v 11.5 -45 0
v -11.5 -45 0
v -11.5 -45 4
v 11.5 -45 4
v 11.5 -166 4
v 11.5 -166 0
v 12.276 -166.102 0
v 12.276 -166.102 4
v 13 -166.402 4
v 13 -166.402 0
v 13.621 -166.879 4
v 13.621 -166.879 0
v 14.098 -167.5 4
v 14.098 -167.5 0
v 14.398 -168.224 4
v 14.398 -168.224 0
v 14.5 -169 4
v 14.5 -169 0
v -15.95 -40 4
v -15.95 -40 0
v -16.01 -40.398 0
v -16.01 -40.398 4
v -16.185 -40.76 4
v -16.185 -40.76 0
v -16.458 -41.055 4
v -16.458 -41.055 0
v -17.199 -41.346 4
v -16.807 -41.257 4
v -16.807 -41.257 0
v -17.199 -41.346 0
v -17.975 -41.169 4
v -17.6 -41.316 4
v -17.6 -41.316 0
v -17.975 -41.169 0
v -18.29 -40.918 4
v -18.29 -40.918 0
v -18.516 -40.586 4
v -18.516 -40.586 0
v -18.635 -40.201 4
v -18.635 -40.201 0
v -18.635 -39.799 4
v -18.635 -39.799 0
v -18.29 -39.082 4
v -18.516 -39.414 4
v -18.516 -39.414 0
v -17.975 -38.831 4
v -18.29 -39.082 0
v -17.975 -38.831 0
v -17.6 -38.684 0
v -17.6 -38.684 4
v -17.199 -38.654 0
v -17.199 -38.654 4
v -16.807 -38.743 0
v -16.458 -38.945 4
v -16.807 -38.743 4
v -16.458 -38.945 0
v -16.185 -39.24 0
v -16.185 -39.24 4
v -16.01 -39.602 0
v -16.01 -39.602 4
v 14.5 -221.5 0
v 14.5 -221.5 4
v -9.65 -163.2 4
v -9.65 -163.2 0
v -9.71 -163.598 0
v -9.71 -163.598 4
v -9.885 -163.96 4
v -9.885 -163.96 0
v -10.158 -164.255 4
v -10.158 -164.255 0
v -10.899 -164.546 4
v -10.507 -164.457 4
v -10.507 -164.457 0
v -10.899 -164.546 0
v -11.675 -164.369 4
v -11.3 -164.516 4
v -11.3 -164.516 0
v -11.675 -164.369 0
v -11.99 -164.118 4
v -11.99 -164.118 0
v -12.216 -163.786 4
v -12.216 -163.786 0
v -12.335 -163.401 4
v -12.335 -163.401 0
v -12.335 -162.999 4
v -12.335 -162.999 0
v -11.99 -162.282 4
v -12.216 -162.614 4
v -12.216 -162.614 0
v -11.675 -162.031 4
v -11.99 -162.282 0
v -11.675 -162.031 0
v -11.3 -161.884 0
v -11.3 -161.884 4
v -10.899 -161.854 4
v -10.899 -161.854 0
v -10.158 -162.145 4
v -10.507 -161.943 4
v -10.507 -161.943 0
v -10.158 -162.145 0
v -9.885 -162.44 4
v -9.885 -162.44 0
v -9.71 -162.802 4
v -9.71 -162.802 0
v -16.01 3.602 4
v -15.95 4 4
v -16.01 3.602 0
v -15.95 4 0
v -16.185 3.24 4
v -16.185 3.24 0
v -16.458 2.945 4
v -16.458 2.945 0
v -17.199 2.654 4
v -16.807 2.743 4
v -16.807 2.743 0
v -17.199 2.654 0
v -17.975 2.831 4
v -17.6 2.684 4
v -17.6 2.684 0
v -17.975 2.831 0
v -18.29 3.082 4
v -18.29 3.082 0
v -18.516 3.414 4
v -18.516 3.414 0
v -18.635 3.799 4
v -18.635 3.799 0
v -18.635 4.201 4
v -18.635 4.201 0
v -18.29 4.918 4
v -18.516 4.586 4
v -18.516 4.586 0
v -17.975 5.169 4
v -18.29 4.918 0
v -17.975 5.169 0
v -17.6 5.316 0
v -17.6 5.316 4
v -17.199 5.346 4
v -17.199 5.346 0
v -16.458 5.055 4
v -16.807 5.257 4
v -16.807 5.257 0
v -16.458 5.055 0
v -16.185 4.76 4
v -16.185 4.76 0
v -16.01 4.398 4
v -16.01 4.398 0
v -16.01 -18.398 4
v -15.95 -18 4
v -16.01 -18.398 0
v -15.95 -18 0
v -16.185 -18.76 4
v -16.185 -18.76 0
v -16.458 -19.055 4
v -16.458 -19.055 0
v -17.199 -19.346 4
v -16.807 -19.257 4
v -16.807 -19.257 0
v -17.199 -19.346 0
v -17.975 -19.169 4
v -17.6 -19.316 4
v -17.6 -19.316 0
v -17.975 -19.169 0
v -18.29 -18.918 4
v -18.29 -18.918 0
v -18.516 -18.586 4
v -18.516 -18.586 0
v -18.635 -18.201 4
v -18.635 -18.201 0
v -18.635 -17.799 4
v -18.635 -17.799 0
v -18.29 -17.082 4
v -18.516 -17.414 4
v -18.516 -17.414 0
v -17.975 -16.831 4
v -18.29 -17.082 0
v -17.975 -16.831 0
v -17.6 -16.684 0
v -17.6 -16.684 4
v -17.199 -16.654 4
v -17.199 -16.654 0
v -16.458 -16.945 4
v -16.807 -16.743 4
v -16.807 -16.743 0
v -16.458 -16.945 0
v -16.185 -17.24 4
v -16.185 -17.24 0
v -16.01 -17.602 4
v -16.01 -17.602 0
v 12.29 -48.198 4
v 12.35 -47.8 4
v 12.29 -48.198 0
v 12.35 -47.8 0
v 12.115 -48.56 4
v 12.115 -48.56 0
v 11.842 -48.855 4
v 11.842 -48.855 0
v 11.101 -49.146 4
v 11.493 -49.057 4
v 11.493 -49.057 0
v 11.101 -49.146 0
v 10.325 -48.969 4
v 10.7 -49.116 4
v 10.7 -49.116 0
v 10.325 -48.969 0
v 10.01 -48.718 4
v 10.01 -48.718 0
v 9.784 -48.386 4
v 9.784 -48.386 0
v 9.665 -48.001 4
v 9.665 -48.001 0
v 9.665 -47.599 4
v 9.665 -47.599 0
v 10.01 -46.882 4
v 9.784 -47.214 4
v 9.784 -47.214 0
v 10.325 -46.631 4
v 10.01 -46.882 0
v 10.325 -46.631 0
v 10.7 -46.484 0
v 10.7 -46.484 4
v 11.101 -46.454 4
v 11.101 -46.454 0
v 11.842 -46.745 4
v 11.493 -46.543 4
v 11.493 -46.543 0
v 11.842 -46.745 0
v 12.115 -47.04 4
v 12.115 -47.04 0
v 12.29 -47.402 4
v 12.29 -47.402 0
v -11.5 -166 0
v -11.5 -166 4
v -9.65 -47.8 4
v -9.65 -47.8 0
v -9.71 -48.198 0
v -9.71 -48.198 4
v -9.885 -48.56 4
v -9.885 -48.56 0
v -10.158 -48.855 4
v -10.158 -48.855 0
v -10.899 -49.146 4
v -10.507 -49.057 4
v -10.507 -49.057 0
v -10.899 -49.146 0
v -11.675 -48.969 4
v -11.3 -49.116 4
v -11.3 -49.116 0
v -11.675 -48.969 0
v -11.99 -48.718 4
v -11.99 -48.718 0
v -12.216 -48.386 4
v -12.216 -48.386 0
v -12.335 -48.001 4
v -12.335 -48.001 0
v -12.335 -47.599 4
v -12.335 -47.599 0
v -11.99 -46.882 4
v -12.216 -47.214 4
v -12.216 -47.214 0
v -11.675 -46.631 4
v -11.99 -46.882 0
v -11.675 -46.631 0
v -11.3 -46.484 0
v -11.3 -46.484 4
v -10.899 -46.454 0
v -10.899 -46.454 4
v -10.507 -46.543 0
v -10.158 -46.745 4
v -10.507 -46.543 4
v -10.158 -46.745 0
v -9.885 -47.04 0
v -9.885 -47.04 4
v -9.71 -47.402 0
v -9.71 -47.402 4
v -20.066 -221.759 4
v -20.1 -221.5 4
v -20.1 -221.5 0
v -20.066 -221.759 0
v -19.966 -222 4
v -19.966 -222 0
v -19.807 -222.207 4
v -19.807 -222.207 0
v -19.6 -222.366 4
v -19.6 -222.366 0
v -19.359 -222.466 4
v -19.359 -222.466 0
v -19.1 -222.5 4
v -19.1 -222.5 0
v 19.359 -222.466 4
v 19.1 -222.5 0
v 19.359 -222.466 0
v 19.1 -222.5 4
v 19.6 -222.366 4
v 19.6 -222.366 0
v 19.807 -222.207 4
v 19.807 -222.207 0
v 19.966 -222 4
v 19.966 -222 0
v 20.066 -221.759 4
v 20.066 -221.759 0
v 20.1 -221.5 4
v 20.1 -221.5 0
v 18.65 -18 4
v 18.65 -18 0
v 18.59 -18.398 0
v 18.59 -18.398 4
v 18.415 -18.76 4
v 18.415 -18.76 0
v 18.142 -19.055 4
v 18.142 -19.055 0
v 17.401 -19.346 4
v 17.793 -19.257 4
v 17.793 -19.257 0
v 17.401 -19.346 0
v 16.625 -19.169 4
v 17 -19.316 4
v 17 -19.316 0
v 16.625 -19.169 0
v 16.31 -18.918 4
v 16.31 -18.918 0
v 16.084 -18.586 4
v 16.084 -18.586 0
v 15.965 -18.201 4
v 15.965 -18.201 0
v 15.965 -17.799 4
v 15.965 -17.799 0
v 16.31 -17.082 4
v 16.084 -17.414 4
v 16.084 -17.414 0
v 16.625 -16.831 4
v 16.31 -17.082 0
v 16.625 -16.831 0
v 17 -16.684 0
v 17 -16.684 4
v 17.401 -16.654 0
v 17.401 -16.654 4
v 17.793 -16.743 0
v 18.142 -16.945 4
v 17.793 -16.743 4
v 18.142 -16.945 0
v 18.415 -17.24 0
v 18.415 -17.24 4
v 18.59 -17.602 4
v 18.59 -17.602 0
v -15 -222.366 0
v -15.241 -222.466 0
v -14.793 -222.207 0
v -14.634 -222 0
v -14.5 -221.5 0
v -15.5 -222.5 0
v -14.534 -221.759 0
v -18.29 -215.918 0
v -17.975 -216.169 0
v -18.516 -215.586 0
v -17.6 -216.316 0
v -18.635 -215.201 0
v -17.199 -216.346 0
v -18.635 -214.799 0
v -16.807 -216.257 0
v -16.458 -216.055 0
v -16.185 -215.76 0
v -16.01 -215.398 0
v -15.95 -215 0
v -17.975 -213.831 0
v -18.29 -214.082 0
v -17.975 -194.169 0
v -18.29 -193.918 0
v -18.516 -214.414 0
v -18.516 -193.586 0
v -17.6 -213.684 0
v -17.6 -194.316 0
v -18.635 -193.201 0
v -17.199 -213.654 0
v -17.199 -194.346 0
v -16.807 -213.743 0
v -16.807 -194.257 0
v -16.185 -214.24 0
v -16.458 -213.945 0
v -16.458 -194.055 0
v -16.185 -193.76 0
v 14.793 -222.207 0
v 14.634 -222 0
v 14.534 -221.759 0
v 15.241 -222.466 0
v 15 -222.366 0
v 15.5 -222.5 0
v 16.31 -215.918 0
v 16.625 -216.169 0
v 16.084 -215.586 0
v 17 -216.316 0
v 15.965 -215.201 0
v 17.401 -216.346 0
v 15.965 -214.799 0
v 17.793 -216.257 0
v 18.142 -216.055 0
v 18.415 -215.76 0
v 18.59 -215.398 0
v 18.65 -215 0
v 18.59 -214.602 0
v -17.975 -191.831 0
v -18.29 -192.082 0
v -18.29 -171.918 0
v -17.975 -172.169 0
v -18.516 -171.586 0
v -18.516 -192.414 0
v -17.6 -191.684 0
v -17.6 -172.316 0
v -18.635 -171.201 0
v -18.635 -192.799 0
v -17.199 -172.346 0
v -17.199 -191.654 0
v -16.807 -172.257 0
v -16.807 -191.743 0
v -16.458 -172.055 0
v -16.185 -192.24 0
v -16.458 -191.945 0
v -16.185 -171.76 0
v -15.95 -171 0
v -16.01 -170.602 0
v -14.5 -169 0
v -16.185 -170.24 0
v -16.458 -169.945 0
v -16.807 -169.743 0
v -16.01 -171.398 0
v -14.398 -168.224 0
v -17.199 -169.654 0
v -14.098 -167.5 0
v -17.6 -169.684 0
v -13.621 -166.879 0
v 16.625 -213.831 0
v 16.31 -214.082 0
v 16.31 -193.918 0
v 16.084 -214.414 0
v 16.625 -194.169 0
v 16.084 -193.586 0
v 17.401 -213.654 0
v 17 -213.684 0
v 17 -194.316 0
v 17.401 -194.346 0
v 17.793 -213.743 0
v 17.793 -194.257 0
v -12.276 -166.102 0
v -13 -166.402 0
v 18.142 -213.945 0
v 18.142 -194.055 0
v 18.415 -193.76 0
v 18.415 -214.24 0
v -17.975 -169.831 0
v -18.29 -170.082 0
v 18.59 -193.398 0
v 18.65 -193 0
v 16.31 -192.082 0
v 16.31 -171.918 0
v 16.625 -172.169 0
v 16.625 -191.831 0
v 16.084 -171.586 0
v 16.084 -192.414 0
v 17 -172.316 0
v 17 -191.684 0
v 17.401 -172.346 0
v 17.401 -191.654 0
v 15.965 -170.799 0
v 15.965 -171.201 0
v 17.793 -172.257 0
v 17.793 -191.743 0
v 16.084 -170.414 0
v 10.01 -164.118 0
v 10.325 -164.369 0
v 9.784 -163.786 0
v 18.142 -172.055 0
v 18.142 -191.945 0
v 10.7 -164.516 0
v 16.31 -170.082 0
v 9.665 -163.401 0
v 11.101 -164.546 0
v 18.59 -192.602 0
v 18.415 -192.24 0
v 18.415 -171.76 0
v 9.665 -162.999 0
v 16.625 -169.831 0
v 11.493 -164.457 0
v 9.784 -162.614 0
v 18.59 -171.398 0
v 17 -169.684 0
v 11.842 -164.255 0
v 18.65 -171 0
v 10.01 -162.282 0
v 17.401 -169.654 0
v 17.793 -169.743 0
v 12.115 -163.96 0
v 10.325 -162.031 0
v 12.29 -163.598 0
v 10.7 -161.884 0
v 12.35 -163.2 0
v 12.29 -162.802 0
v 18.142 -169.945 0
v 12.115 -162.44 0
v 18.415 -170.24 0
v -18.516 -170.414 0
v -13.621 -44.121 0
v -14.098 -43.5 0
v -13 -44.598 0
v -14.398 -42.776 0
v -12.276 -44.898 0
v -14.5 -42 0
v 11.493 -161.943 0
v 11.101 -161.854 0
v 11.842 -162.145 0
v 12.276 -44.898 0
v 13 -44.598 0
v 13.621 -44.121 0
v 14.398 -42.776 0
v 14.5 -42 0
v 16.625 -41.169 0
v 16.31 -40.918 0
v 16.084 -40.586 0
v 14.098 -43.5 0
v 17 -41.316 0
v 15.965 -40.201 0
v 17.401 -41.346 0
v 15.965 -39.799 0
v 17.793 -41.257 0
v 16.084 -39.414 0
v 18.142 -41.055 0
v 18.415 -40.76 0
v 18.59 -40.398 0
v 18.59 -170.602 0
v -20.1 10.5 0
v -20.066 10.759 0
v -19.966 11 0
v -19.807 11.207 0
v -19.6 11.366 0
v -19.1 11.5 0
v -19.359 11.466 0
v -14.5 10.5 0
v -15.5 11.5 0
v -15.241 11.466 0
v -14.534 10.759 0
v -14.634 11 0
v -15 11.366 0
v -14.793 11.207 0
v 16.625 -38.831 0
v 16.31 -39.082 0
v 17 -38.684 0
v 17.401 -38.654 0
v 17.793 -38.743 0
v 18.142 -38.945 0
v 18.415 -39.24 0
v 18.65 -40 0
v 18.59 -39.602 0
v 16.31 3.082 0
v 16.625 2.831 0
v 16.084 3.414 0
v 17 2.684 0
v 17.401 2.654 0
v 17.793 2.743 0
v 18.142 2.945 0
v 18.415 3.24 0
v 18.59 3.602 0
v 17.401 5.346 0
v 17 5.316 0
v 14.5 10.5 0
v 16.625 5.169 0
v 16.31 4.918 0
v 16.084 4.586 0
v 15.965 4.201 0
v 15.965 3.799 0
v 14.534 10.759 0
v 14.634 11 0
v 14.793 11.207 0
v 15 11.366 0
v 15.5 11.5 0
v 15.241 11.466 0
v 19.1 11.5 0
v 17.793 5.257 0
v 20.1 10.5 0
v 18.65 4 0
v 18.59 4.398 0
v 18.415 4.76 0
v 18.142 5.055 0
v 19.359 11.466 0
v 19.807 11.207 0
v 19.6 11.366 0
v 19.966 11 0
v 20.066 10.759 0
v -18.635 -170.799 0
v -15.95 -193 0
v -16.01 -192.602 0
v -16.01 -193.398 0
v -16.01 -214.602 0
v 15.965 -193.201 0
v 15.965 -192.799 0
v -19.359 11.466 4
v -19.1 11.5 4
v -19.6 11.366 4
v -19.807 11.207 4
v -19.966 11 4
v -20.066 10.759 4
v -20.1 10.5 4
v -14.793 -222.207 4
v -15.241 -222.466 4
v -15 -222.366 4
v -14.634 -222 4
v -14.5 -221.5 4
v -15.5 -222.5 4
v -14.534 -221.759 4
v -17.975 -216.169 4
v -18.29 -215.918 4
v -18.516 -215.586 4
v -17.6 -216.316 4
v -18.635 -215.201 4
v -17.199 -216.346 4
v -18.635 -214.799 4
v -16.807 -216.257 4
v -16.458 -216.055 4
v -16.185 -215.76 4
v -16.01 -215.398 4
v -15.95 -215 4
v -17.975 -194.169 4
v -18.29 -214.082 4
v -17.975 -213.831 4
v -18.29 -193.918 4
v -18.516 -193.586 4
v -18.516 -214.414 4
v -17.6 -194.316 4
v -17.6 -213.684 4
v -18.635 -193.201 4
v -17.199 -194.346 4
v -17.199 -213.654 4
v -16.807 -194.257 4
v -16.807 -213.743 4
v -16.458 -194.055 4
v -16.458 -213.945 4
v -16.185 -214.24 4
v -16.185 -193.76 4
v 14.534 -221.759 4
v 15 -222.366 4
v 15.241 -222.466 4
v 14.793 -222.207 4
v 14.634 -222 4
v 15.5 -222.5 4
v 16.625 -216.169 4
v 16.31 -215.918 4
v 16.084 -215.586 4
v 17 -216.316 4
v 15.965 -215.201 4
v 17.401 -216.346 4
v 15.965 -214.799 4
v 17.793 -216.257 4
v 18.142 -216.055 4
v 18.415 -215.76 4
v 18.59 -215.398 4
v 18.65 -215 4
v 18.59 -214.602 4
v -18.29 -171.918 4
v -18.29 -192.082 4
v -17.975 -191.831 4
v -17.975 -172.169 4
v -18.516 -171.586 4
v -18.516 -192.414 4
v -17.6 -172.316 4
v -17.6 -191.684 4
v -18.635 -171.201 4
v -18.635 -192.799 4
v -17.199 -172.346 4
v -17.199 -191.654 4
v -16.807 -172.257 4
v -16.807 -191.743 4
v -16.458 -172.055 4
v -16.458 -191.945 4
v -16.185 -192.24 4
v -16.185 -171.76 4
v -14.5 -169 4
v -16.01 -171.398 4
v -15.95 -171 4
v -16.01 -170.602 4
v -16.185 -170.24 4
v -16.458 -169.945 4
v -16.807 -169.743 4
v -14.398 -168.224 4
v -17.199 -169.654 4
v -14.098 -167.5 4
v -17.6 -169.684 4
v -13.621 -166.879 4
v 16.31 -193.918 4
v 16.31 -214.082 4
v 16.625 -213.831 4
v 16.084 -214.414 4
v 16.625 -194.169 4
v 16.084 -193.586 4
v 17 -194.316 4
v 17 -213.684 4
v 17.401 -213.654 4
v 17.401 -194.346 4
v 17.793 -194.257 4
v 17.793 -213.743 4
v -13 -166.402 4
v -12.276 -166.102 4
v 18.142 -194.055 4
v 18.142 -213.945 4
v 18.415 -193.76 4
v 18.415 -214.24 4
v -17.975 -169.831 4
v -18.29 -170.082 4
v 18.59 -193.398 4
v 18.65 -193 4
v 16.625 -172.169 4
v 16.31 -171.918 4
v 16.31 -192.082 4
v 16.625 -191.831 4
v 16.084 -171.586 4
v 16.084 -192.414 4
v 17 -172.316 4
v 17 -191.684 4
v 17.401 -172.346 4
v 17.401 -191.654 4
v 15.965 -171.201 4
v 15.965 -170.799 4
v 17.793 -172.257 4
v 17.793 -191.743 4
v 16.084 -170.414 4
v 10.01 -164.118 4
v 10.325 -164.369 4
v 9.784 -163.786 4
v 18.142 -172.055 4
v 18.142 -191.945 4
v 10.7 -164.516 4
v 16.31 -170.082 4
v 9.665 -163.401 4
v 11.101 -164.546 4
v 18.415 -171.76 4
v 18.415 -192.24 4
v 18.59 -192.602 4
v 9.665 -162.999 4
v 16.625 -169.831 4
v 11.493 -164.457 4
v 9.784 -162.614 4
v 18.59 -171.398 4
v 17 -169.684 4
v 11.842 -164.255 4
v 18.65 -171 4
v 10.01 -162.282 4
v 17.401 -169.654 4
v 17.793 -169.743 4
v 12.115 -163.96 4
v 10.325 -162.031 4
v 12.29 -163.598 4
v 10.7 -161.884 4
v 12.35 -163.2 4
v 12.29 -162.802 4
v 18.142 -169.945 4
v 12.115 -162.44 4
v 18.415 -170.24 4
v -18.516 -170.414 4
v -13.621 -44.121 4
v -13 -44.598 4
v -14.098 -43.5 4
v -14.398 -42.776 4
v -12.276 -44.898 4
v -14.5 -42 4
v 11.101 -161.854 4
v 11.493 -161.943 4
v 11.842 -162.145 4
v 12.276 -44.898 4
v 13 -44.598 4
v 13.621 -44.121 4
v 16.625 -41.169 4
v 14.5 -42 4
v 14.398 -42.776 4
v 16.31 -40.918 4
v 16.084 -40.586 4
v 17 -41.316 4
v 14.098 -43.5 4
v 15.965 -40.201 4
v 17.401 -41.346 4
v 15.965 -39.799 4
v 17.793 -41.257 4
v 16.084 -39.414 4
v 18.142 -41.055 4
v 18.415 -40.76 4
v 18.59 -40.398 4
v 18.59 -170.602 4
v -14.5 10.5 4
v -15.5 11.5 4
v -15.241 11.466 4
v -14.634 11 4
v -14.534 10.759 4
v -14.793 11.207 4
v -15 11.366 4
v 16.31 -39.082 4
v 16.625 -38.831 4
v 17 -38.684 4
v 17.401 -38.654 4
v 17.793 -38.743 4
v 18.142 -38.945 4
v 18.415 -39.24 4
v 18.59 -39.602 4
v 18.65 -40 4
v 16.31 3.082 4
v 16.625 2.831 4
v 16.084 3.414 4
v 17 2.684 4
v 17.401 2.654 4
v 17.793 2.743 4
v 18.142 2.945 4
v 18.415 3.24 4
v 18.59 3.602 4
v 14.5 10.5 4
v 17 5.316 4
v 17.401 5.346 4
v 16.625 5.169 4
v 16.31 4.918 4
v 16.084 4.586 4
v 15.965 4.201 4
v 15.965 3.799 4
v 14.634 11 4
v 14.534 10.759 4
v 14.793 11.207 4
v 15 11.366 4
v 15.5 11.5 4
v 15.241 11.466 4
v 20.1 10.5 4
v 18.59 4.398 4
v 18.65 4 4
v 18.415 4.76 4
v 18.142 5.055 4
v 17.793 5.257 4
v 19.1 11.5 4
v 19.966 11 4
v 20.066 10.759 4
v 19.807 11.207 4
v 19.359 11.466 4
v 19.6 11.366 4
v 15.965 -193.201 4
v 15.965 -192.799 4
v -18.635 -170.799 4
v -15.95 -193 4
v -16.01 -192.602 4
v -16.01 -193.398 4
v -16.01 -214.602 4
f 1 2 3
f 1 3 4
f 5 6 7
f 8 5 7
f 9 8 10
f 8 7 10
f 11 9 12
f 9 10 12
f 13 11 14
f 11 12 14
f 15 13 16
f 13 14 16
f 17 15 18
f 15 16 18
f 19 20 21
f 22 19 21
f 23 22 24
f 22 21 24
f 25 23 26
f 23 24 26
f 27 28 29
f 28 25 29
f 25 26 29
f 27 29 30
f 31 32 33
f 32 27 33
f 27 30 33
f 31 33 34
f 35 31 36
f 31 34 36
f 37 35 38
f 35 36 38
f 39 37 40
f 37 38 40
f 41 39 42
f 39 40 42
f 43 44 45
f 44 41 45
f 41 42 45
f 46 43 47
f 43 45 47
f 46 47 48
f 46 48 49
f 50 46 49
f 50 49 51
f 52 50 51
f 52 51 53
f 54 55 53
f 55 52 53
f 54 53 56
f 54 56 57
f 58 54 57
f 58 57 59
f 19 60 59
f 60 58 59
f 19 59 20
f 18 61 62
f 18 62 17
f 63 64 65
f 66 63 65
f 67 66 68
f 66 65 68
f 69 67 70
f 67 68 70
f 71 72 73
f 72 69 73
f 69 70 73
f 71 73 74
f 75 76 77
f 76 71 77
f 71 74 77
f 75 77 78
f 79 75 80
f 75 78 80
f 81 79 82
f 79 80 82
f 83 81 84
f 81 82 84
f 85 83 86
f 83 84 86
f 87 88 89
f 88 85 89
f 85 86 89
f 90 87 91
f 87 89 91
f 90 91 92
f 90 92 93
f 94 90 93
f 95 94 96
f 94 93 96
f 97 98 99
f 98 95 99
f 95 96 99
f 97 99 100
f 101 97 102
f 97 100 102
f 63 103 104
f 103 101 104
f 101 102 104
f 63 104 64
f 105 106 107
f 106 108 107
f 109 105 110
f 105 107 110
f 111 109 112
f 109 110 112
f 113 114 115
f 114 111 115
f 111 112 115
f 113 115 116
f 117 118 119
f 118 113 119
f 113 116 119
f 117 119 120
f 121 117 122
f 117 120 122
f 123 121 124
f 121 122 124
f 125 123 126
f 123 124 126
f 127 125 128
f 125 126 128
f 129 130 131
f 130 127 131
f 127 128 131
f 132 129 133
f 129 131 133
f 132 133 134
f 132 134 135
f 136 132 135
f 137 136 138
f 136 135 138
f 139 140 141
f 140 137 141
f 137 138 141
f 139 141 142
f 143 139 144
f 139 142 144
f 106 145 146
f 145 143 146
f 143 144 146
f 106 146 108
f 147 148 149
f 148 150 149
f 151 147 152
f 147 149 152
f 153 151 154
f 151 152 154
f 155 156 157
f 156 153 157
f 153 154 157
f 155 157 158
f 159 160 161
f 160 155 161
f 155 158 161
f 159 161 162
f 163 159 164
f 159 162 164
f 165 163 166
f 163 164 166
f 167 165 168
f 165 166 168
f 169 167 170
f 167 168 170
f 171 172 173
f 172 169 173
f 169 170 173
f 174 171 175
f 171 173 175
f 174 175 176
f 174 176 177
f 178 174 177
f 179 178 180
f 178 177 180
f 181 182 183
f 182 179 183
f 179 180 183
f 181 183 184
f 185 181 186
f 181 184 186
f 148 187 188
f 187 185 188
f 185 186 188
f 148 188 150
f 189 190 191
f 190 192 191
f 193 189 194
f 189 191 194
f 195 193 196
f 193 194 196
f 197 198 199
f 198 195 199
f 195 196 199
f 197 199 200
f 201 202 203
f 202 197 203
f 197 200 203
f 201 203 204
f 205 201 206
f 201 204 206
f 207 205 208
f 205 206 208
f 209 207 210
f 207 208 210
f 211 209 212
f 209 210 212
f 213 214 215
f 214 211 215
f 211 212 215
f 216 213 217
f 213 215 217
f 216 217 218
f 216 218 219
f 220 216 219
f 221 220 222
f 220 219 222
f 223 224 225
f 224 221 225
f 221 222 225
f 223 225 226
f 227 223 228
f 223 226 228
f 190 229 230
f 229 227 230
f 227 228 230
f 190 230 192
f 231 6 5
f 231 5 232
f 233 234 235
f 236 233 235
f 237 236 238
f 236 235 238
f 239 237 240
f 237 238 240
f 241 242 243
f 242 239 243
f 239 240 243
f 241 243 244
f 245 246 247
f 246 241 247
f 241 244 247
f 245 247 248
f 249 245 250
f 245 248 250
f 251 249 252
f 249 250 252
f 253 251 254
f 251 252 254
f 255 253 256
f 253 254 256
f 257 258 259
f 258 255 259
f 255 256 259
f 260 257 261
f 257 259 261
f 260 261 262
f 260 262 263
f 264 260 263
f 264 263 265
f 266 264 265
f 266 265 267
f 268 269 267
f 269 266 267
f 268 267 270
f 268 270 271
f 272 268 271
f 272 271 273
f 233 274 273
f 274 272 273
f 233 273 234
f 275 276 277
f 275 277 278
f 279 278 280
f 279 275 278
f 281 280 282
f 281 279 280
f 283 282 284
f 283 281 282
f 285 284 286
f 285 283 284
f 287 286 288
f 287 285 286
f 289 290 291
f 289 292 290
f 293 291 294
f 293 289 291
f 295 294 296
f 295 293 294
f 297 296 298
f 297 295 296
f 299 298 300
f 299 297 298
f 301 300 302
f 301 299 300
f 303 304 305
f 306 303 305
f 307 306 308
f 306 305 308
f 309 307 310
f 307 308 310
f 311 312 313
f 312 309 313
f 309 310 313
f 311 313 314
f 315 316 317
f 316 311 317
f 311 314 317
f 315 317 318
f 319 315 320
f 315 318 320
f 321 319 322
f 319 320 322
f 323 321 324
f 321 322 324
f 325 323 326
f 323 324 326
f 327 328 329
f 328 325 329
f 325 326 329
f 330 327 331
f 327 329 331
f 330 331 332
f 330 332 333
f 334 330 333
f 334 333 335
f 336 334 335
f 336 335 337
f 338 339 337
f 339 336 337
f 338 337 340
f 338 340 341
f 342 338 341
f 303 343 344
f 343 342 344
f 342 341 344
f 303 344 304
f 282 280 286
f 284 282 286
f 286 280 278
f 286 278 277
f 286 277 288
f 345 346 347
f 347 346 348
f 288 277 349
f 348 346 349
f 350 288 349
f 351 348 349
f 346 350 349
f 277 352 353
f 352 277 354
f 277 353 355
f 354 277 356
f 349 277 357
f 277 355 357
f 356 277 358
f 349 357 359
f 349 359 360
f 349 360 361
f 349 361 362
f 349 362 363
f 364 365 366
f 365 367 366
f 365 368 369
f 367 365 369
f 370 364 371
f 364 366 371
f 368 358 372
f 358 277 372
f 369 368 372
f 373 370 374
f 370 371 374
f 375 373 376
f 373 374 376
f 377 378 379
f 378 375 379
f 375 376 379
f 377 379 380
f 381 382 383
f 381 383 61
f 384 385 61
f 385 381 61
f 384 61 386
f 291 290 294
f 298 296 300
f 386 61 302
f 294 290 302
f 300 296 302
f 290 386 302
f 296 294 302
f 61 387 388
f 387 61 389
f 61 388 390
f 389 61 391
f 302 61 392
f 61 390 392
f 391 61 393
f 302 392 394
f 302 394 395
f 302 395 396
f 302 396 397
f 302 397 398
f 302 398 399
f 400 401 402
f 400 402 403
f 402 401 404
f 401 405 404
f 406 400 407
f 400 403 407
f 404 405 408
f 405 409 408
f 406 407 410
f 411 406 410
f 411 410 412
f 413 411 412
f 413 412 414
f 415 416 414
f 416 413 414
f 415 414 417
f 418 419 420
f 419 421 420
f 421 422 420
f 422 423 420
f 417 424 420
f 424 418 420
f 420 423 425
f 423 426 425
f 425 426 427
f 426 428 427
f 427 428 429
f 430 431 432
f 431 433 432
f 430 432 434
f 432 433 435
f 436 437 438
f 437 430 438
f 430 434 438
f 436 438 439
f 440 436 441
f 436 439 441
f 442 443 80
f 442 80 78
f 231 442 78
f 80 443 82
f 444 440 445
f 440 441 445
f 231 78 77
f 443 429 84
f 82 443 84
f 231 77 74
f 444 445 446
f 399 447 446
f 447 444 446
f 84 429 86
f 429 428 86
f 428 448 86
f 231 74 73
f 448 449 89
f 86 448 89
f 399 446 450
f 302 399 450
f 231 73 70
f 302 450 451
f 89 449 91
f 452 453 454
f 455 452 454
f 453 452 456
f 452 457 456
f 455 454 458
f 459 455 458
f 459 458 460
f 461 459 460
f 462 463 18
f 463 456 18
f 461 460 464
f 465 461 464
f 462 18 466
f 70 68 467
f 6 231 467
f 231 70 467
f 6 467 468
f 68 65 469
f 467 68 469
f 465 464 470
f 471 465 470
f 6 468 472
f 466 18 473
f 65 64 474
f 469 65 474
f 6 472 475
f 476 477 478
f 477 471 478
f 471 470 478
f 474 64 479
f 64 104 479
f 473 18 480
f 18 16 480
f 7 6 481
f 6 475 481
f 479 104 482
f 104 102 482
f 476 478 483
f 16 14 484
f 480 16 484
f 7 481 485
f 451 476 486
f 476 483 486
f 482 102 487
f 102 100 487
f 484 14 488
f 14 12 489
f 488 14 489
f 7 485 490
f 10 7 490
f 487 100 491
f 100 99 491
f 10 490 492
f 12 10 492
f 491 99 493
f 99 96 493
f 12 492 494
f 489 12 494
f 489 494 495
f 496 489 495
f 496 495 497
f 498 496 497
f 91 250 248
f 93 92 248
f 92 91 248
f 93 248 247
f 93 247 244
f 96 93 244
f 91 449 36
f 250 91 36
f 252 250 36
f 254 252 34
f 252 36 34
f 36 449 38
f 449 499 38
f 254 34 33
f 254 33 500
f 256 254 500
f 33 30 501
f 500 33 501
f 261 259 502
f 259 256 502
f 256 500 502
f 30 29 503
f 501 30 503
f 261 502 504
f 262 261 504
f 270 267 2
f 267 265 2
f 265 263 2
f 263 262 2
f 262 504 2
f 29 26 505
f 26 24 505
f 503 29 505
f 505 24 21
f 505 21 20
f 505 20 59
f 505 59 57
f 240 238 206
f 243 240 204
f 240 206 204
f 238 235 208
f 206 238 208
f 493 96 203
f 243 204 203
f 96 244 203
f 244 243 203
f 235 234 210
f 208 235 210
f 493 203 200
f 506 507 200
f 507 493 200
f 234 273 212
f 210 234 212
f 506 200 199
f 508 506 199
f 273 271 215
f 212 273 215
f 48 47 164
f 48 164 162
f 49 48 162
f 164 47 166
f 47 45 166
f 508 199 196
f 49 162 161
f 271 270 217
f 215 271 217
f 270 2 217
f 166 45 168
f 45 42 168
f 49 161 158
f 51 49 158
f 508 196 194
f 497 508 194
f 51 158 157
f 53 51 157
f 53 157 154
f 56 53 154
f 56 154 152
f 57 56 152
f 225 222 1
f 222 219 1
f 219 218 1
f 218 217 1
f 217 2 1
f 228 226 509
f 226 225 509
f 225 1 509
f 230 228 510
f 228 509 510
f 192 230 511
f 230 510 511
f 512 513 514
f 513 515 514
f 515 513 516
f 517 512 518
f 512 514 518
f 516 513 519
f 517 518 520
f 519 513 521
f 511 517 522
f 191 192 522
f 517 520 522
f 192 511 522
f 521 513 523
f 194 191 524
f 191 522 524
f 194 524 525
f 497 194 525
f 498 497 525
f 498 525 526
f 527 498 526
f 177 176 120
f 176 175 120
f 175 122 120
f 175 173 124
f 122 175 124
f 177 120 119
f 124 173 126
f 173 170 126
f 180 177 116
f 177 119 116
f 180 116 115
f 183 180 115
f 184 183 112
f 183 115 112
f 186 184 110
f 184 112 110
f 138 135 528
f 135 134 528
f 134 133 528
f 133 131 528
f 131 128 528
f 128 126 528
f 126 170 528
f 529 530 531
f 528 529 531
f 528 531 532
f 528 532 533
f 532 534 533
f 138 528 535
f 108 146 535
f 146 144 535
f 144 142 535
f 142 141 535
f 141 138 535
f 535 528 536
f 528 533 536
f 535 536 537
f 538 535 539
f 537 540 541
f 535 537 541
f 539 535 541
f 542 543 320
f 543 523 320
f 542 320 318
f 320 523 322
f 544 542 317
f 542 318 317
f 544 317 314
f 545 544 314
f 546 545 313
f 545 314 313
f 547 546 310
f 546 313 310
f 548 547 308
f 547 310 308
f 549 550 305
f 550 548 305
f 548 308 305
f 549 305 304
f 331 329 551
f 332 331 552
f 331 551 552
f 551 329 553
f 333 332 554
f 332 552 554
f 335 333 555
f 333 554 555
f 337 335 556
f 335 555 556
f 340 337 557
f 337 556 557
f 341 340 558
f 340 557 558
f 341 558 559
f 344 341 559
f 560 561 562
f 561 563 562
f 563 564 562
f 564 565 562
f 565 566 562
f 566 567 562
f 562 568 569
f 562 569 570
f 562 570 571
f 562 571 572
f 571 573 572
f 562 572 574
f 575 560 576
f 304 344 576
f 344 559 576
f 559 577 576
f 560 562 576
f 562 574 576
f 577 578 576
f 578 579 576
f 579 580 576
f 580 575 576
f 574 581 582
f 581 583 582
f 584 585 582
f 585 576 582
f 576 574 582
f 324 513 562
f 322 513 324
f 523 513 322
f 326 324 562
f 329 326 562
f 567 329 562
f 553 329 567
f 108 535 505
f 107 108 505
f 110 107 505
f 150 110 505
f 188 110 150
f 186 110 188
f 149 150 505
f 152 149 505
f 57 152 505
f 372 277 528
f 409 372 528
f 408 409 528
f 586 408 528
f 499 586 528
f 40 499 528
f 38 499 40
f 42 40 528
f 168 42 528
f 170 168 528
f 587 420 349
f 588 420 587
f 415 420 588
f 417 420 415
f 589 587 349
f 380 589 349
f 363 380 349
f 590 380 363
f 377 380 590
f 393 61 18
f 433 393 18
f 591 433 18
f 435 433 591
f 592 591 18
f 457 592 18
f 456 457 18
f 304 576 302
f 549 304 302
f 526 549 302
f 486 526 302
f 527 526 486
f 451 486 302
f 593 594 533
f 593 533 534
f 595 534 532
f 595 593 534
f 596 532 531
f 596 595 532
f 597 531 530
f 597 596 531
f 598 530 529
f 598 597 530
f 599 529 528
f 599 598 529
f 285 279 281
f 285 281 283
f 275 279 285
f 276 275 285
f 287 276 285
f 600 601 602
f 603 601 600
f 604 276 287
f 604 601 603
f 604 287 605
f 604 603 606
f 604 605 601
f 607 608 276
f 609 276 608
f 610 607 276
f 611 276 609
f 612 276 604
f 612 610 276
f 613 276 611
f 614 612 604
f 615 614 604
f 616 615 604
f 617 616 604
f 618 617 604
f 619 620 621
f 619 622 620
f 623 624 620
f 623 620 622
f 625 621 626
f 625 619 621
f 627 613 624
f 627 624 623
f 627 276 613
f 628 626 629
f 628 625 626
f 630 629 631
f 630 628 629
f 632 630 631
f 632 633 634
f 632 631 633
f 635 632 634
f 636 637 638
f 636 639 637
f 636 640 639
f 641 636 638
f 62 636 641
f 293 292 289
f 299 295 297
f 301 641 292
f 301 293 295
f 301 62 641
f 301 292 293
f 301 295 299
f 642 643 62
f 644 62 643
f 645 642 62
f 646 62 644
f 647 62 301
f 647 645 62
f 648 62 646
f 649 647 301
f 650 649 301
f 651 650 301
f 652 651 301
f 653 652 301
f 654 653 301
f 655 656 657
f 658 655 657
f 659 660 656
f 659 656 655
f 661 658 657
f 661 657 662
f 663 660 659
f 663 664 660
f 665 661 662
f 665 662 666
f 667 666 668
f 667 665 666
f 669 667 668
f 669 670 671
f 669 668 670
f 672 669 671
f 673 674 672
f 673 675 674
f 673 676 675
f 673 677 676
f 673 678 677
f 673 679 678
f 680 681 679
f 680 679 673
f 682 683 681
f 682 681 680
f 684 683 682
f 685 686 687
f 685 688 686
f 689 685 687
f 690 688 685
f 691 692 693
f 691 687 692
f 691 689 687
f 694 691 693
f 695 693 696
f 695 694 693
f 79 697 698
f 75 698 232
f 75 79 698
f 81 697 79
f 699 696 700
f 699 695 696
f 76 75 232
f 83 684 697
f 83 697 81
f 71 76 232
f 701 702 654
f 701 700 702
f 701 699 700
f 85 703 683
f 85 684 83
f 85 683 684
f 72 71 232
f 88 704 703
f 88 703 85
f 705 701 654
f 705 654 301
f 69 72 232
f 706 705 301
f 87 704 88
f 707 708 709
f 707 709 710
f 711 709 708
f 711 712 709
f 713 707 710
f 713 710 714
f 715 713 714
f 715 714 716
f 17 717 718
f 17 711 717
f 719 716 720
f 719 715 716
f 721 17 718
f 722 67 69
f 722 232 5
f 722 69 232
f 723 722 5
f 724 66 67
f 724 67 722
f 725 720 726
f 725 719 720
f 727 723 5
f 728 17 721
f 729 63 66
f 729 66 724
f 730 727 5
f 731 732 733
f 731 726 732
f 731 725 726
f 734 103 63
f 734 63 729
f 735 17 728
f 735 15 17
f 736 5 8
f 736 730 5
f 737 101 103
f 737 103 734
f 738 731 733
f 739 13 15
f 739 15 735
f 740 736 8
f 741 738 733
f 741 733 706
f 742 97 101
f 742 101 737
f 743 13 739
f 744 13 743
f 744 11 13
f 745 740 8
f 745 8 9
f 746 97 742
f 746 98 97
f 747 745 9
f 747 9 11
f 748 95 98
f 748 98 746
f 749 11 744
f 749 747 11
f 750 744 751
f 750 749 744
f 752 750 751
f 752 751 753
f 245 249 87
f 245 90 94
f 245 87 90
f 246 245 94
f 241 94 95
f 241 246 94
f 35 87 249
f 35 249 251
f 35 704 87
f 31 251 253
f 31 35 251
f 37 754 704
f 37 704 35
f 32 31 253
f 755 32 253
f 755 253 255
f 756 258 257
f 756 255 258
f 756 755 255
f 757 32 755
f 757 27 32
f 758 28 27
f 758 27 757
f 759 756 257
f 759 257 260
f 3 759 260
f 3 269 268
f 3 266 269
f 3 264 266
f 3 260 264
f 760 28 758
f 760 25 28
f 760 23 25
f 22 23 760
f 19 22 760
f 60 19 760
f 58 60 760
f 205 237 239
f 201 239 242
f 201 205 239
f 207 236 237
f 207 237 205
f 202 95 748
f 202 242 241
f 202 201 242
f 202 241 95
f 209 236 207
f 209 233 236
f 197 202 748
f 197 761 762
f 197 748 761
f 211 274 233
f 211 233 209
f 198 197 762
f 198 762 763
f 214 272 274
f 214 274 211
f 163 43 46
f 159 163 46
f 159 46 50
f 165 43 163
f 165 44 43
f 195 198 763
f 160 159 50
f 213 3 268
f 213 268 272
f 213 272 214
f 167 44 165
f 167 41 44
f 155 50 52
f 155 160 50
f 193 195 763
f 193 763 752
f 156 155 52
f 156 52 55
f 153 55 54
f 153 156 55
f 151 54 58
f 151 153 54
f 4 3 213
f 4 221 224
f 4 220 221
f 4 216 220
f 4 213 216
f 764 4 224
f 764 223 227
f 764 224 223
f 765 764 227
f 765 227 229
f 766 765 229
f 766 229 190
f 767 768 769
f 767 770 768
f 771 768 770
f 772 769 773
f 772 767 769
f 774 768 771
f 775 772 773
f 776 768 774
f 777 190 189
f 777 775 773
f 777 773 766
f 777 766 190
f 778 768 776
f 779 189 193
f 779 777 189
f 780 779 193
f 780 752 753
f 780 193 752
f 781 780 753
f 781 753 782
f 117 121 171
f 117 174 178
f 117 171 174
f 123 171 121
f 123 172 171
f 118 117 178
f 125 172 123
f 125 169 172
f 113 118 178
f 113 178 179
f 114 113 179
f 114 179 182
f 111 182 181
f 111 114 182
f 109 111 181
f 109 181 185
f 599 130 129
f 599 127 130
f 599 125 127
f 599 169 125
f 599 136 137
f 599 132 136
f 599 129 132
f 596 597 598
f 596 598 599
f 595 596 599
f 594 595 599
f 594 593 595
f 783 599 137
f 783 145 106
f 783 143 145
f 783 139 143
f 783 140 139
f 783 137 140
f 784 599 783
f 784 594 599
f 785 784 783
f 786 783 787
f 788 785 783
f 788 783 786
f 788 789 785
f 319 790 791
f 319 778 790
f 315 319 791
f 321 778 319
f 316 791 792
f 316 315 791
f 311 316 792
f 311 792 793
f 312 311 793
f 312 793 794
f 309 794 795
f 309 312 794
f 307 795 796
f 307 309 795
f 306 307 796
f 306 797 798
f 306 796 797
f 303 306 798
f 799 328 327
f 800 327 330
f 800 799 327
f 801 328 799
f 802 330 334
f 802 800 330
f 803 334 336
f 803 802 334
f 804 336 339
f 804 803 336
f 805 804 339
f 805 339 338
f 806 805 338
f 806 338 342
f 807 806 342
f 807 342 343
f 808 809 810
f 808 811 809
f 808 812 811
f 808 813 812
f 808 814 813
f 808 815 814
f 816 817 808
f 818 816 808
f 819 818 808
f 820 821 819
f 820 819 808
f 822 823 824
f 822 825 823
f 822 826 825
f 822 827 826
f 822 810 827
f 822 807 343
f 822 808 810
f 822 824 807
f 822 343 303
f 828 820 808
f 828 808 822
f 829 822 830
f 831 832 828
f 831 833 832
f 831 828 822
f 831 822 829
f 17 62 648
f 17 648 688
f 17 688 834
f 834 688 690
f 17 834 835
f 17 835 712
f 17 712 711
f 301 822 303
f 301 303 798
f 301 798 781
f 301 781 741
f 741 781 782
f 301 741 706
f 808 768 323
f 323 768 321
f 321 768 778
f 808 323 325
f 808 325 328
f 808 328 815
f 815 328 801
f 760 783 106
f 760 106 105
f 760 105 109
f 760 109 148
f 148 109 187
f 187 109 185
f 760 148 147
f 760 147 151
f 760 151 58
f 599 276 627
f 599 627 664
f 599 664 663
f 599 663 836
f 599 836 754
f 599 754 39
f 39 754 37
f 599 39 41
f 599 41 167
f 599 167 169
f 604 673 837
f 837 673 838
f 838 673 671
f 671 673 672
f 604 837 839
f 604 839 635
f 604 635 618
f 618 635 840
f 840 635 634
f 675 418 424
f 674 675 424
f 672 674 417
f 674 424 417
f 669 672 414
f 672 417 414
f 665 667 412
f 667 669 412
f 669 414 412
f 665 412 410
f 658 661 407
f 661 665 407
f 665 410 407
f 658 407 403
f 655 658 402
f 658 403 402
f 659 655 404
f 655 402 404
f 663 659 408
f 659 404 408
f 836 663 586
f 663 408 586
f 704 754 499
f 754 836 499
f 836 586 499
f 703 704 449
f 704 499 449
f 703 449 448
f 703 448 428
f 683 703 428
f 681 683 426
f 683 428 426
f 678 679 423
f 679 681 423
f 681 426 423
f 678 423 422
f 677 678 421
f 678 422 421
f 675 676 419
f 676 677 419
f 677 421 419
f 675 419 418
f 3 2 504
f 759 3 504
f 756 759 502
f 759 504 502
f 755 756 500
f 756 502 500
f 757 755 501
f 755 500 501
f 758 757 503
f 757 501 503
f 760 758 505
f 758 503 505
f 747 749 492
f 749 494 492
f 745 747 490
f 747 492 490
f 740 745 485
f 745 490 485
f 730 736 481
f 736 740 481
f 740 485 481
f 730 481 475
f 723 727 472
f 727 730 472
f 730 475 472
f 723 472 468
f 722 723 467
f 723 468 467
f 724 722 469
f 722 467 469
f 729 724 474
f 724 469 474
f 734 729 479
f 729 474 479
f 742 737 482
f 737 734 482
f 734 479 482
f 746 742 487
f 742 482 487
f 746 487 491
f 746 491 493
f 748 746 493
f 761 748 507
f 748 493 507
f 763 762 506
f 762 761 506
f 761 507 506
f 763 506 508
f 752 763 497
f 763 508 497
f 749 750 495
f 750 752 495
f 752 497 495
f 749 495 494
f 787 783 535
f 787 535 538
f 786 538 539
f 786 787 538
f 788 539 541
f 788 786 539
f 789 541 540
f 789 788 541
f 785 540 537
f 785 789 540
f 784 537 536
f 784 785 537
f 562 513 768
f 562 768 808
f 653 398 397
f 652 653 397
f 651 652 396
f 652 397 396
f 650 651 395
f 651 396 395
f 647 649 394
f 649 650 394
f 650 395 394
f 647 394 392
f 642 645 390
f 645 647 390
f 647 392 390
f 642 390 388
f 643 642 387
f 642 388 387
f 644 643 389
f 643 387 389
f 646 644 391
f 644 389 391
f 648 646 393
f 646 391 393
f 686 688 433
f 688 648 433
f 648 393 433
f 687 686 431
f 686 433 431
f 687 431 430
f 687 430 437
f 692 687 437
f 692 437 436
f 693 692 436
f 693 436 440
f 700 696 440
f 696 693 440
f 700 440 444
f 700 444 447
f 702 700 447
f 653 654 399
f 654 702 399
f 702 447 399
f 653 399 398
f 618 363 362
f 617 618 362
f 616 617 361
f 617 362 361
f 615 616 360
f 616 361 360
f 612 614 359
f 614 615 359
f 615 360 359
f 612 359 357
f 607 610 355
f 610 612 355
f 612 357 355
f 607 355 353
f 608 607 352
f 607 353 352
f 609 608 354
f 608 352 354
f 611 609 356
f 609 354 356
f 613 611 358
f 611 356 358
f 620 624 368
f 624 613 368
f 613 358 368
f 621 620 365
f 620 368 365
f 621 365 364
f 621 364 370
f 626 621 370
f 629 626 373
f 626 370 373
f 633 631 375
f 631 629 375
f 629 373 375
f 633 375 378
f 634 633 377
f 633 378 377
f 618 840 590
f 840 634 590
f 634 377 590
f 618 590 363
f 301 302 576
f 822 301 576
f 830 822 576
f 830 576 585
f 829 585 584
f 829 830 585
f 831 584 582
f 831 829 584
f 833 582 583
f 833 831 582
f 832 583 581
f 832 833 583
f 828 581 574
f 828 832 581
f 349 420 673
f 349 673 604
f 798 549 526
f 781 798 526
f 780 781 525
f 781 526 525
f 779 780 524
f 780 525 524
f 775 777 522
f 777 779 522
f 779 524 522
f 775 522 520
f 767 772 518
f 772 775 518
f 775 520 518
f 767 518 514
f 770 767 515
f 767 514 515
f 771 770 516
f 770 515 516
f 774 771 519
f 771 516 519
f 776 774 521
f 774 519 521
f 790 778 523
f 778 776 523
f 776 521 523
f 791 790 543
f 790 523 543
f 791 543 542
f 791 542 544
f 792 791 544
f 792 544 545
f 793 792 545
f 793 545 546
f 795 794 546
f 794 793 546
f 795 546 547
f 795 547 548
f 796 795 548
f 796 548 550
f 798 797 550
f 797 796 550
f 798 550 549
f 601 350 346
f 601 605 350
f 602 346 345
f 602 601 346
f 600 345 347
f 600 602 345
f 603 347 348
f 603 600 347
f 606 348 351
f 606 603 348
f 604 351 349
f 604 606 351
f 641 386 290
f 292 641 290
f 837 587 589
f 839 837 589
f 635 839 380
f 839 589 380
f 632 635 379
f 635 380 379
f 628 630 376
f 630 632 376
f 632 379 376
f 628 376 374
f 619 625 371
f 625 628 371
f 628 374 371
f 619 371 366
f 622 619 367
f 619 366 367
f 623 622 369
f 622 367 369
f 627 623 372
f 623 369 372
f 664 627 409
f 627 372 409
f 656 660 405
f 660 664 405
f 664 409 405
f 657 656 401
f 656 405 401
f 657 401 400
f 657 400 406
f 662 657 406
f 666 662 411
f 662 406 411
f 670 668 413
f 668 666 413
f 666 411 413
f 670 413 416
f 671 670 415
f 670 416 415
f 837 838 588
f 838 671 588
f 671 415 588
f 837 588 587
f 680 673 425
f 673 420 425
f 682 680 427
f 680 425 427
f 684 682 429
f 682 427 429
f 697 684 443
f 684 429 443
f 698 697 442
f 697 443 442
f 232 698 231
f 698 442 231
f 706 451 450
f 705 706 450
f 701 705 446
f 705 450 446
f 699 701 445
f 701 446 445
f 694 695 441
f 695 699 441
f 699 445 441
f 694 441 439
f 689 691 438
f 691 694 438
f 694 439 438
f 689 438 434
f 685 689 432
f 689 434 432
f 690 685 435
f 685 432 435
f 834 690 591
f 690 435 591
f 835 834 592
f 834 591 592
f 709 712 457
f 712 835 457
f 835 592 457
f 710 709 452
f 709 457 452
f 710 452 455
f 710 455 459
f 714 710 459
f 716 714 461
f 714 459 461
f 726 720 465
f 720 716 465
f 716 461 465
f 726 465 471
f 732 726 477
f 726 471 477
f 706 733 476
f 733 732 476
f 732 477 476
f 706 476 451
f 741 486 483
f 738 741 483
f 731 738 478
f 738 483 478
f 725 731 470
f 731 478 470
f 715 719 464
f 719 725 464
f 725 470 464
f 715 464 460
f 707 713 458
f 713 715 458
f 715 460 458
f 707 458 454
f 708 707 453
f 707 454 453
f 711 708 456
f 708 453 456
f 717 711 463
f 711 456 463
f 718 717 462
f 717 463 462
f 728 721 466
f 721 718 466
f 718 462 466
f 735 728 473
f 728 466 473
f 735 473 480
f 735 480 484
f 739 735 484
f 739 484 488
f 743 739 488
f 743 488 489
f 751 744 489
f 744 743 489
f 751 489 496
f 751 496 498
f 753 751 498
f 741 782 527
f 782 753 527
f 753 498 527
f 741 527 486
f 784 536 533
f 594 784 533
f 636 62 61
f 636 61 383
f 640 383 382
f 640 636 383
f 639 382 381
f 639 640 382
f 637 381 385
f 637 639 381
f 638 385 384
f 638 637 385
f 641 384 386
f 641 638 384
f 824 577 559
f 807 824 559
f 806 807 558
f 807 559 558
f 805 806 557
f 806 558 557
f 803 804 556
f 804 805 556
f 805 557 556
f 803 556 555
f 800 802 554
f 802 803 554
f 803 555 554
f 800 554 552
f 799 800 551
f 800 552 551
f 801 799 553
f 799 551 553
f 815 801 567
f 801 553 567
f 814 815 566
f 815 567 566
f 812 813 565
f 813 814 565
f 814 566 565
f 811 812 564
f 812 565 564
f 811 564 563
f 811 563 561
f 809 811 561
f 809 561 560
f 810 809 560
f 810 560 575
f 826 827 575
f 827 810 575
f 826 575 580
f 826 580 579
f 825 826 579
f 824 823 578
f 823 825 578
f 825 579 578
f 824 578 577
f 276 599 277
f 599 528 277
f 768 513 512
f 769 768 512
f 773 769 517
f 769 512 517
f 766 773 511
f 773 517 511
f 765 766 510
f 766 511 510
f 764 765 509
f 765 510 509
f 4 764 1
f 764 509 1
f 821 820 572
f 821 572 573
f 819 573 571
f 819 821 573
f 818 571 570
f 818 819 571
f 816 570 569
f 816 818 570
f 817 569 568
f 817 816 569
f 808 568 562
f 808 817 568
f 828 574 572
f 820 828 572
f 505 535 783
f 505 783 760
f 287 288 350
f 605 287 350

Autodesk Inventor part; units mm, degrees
ref_plane "YZ Plane" through (0, 0, 0) normal (1, 0, 0) x (0, 1, 0)
ref_plane "XZ Plane" through (0, 0, 0) normal (0, 1, 0) x (-1, 0, 0)
ref_plane "XY Plane" through (0, 0, 0) normal (0, 0, 1) x (1, 0, 0)
sketch "스케치1" plane through (0, 0, 0) normal (0, 0, 1) x (1, 0, 0)
  line L0 (-15, 14.5) -> (-11.5, 14.5)
  line L1 (-15, 14.5) -> (-20.1, 8.5)
  line L2 (-20.1, 8.5) -> (-20.1, -44.6)
  line L3 (-20.1, -44.6) -> (-15, -50.6)
  line L4 (-15, -50.6) -> (15, -50.6)
  line L5 (15, -50.6) -> (20.1, -44.6)
  line L6 (20.1, -44.6) -> (20.1, 8.5)
  line L7 (20.1, 8.5) -> (15, 14.5)
  line L8 (11.5, 14.5) -> (15, 14.5)
  arc A0 (14.5, 11.5) -> (11.5, 14.5) centre (11.5, 11.5) ccw
  line L9 (14.5, -42) -> (14.5, 11.5)
  arc A1 (11.5, -45) -> (14.5, -42) centre (11.5, -42) ccw
  line L10 (-11.5, -45) -> (11.5, -45)
  arc A2 (-14.5, -42) -> (-11.5, -45) centre (-11.5, -42) ccw
  line L11 (-14.5, 11.5) -> (-14.5, -42)
  arc A3 (-11.5, 14.5) -> (-14.5, 11.5) centre (-11.5, 11.5) ccw
  circle A4 centre (-17.3, 4) radius 1.35
  circle A5 centre (-17.3, -18) radius 1.35
  circle A6 centre (-11, -47.8) radius 1.35
  circle A7 centre (17.3, 4) radius 1.35
  circle A8 centre (17.3, -18) radius 1.35
  circle A9 centre (11, -47.8) radius 1.35
  circle A10 centre (-17.3, -40) radius 1.35
  circle A11 centre (17.3, -40) radius 1.35
  line L12 (15, -225.5) -> (11.5, -225.5)
  line L13 (15, -225.5) -> (20.1, -219.5)
  line L14 (20.1, -219.5) -> (20.1, -166.4)
  line L15 (20.1, -166.4) -> (15, -160.4)
  line L16 (15, -160.4) -> (-15, -160.4)
  line L17 (-15, -160.4) -> (-20.1, -166.4)
  line L18 (-20.1, -166.4) -> (-20.1, -219.5)
  line L19 (-20.1, -219.5) -> (-15, -225.5)
  line L20 (-11.5, -225.5) -> (-15, -225.5)
  arc A12 (-14.5, -222.5) -> (-11.5, -225.5) centre (-11.5, -222.5) ccw
  line L21 (-14.5, -169) -> (-14.5, -222.5)
  arc A13 (-11.5, -166) -> (-14.5, -169) centre (-11.5, -169) ccw
  line L22 (11.5, -166) -> (-11.5, -166)
  arc A14 (14.5, -169) -> (11.5, -166) centre (11.5, -169) ccw
  line L23 (14.5, -222.5) -> (14.5, -169)
  arc A15 (11.5, -225.5) -> (14.5, -222.5) centre (11.5, -222.5) ccw
  circle A16 centre (17.3, -215) radius 1.35
  circle A17 centre (17.3, -193) radius 1.35
  circle A18 centre (11, -163.2) radius 1.35
  circle A19 centre (-17.3, -215) radius 1.35
  circle A20 centre (-17.3, -193) radius 1.35
  circle A21 centre (-11, -163.2) radius 1.35
  circle A22 centre (17.3, -171) radius 1.35
  circle A23 centre (-17.3, -171) radius 1.35
  line L24 (20.1, -222.5) -> (20.1, 11.5)
  line L25 (-20.1, 11.5) -> (-20.1, -222.5)
  line L26 (14.5, -222.5) -> (14.5, -169)
  line L27 (11.5, -166) -> (-11.5, -166)
  line L28 (-14.5, -169) -> (-14.5, -222.5)
  arc A24 (14.5, -169) -> (11.5, -166) centre (11.5, -169) ccw
  arc A25 (-11.5, -166) -> (-14.5, -169) centre (-11.5, -169) ccw
  arc A26 (11.5, -45) -> (14.5, -42) centre (11.5, -42) ccw
  arc A27 (-14.5, -42) -> (-11.5, -45) centre (-11.5, -42) ccw
  line L29 (11.5, -45) -> (-11.5, -45)
  line L30 (-14.5, -42) -> (-14.5, 11.5)
  line L31 (14.5, 11.5) -> (14.5, -42)
  line L32 (20.1, 11.5) -> (14.5, 11.5)
  line L33 (-14.5, 11.5) -> (-20.1, 11.5)
  line L34 (-20.1, -222.5) -> (-14.5, -222.5)
  line L35 (14.5, -222.5) -> (20.1, -222.5)
  point P0 (0, 0)
  dimension "d0" = 3
extrude "판1" add sketch "스케치1" along normal blind 4 contours L33 L11 A2 L10 A1 L9 L32 L7 L6 L5 L4 L3 L2 L1 | L1 L25 L33 | L3 L4 L5 L24 L15 L16 L17 L25 | L17 L16 L15 L14 L13 L35 L23 A14 L22 A13 L21 L34 L19 L18 | L19 L34 L25 | L7 L32 L24 | L24 L35 L13
fillet "모서리 라운드1" radius 1 8 edges at (14.5, -222.5, 2) (20.1, -222.5, 2) (-14.5, -222.5, 2) (-20.1, -222.5, 2) (-20.1, 11.5, 2) (-14.5, 11.5, 2) (14.5, 11.5, 2) (20.1, 11.5, 2)
equation "\"TransitionRadius\" = BendRadius"
equation "\"BendRadius\" = 4"
properties part number "bar1"
